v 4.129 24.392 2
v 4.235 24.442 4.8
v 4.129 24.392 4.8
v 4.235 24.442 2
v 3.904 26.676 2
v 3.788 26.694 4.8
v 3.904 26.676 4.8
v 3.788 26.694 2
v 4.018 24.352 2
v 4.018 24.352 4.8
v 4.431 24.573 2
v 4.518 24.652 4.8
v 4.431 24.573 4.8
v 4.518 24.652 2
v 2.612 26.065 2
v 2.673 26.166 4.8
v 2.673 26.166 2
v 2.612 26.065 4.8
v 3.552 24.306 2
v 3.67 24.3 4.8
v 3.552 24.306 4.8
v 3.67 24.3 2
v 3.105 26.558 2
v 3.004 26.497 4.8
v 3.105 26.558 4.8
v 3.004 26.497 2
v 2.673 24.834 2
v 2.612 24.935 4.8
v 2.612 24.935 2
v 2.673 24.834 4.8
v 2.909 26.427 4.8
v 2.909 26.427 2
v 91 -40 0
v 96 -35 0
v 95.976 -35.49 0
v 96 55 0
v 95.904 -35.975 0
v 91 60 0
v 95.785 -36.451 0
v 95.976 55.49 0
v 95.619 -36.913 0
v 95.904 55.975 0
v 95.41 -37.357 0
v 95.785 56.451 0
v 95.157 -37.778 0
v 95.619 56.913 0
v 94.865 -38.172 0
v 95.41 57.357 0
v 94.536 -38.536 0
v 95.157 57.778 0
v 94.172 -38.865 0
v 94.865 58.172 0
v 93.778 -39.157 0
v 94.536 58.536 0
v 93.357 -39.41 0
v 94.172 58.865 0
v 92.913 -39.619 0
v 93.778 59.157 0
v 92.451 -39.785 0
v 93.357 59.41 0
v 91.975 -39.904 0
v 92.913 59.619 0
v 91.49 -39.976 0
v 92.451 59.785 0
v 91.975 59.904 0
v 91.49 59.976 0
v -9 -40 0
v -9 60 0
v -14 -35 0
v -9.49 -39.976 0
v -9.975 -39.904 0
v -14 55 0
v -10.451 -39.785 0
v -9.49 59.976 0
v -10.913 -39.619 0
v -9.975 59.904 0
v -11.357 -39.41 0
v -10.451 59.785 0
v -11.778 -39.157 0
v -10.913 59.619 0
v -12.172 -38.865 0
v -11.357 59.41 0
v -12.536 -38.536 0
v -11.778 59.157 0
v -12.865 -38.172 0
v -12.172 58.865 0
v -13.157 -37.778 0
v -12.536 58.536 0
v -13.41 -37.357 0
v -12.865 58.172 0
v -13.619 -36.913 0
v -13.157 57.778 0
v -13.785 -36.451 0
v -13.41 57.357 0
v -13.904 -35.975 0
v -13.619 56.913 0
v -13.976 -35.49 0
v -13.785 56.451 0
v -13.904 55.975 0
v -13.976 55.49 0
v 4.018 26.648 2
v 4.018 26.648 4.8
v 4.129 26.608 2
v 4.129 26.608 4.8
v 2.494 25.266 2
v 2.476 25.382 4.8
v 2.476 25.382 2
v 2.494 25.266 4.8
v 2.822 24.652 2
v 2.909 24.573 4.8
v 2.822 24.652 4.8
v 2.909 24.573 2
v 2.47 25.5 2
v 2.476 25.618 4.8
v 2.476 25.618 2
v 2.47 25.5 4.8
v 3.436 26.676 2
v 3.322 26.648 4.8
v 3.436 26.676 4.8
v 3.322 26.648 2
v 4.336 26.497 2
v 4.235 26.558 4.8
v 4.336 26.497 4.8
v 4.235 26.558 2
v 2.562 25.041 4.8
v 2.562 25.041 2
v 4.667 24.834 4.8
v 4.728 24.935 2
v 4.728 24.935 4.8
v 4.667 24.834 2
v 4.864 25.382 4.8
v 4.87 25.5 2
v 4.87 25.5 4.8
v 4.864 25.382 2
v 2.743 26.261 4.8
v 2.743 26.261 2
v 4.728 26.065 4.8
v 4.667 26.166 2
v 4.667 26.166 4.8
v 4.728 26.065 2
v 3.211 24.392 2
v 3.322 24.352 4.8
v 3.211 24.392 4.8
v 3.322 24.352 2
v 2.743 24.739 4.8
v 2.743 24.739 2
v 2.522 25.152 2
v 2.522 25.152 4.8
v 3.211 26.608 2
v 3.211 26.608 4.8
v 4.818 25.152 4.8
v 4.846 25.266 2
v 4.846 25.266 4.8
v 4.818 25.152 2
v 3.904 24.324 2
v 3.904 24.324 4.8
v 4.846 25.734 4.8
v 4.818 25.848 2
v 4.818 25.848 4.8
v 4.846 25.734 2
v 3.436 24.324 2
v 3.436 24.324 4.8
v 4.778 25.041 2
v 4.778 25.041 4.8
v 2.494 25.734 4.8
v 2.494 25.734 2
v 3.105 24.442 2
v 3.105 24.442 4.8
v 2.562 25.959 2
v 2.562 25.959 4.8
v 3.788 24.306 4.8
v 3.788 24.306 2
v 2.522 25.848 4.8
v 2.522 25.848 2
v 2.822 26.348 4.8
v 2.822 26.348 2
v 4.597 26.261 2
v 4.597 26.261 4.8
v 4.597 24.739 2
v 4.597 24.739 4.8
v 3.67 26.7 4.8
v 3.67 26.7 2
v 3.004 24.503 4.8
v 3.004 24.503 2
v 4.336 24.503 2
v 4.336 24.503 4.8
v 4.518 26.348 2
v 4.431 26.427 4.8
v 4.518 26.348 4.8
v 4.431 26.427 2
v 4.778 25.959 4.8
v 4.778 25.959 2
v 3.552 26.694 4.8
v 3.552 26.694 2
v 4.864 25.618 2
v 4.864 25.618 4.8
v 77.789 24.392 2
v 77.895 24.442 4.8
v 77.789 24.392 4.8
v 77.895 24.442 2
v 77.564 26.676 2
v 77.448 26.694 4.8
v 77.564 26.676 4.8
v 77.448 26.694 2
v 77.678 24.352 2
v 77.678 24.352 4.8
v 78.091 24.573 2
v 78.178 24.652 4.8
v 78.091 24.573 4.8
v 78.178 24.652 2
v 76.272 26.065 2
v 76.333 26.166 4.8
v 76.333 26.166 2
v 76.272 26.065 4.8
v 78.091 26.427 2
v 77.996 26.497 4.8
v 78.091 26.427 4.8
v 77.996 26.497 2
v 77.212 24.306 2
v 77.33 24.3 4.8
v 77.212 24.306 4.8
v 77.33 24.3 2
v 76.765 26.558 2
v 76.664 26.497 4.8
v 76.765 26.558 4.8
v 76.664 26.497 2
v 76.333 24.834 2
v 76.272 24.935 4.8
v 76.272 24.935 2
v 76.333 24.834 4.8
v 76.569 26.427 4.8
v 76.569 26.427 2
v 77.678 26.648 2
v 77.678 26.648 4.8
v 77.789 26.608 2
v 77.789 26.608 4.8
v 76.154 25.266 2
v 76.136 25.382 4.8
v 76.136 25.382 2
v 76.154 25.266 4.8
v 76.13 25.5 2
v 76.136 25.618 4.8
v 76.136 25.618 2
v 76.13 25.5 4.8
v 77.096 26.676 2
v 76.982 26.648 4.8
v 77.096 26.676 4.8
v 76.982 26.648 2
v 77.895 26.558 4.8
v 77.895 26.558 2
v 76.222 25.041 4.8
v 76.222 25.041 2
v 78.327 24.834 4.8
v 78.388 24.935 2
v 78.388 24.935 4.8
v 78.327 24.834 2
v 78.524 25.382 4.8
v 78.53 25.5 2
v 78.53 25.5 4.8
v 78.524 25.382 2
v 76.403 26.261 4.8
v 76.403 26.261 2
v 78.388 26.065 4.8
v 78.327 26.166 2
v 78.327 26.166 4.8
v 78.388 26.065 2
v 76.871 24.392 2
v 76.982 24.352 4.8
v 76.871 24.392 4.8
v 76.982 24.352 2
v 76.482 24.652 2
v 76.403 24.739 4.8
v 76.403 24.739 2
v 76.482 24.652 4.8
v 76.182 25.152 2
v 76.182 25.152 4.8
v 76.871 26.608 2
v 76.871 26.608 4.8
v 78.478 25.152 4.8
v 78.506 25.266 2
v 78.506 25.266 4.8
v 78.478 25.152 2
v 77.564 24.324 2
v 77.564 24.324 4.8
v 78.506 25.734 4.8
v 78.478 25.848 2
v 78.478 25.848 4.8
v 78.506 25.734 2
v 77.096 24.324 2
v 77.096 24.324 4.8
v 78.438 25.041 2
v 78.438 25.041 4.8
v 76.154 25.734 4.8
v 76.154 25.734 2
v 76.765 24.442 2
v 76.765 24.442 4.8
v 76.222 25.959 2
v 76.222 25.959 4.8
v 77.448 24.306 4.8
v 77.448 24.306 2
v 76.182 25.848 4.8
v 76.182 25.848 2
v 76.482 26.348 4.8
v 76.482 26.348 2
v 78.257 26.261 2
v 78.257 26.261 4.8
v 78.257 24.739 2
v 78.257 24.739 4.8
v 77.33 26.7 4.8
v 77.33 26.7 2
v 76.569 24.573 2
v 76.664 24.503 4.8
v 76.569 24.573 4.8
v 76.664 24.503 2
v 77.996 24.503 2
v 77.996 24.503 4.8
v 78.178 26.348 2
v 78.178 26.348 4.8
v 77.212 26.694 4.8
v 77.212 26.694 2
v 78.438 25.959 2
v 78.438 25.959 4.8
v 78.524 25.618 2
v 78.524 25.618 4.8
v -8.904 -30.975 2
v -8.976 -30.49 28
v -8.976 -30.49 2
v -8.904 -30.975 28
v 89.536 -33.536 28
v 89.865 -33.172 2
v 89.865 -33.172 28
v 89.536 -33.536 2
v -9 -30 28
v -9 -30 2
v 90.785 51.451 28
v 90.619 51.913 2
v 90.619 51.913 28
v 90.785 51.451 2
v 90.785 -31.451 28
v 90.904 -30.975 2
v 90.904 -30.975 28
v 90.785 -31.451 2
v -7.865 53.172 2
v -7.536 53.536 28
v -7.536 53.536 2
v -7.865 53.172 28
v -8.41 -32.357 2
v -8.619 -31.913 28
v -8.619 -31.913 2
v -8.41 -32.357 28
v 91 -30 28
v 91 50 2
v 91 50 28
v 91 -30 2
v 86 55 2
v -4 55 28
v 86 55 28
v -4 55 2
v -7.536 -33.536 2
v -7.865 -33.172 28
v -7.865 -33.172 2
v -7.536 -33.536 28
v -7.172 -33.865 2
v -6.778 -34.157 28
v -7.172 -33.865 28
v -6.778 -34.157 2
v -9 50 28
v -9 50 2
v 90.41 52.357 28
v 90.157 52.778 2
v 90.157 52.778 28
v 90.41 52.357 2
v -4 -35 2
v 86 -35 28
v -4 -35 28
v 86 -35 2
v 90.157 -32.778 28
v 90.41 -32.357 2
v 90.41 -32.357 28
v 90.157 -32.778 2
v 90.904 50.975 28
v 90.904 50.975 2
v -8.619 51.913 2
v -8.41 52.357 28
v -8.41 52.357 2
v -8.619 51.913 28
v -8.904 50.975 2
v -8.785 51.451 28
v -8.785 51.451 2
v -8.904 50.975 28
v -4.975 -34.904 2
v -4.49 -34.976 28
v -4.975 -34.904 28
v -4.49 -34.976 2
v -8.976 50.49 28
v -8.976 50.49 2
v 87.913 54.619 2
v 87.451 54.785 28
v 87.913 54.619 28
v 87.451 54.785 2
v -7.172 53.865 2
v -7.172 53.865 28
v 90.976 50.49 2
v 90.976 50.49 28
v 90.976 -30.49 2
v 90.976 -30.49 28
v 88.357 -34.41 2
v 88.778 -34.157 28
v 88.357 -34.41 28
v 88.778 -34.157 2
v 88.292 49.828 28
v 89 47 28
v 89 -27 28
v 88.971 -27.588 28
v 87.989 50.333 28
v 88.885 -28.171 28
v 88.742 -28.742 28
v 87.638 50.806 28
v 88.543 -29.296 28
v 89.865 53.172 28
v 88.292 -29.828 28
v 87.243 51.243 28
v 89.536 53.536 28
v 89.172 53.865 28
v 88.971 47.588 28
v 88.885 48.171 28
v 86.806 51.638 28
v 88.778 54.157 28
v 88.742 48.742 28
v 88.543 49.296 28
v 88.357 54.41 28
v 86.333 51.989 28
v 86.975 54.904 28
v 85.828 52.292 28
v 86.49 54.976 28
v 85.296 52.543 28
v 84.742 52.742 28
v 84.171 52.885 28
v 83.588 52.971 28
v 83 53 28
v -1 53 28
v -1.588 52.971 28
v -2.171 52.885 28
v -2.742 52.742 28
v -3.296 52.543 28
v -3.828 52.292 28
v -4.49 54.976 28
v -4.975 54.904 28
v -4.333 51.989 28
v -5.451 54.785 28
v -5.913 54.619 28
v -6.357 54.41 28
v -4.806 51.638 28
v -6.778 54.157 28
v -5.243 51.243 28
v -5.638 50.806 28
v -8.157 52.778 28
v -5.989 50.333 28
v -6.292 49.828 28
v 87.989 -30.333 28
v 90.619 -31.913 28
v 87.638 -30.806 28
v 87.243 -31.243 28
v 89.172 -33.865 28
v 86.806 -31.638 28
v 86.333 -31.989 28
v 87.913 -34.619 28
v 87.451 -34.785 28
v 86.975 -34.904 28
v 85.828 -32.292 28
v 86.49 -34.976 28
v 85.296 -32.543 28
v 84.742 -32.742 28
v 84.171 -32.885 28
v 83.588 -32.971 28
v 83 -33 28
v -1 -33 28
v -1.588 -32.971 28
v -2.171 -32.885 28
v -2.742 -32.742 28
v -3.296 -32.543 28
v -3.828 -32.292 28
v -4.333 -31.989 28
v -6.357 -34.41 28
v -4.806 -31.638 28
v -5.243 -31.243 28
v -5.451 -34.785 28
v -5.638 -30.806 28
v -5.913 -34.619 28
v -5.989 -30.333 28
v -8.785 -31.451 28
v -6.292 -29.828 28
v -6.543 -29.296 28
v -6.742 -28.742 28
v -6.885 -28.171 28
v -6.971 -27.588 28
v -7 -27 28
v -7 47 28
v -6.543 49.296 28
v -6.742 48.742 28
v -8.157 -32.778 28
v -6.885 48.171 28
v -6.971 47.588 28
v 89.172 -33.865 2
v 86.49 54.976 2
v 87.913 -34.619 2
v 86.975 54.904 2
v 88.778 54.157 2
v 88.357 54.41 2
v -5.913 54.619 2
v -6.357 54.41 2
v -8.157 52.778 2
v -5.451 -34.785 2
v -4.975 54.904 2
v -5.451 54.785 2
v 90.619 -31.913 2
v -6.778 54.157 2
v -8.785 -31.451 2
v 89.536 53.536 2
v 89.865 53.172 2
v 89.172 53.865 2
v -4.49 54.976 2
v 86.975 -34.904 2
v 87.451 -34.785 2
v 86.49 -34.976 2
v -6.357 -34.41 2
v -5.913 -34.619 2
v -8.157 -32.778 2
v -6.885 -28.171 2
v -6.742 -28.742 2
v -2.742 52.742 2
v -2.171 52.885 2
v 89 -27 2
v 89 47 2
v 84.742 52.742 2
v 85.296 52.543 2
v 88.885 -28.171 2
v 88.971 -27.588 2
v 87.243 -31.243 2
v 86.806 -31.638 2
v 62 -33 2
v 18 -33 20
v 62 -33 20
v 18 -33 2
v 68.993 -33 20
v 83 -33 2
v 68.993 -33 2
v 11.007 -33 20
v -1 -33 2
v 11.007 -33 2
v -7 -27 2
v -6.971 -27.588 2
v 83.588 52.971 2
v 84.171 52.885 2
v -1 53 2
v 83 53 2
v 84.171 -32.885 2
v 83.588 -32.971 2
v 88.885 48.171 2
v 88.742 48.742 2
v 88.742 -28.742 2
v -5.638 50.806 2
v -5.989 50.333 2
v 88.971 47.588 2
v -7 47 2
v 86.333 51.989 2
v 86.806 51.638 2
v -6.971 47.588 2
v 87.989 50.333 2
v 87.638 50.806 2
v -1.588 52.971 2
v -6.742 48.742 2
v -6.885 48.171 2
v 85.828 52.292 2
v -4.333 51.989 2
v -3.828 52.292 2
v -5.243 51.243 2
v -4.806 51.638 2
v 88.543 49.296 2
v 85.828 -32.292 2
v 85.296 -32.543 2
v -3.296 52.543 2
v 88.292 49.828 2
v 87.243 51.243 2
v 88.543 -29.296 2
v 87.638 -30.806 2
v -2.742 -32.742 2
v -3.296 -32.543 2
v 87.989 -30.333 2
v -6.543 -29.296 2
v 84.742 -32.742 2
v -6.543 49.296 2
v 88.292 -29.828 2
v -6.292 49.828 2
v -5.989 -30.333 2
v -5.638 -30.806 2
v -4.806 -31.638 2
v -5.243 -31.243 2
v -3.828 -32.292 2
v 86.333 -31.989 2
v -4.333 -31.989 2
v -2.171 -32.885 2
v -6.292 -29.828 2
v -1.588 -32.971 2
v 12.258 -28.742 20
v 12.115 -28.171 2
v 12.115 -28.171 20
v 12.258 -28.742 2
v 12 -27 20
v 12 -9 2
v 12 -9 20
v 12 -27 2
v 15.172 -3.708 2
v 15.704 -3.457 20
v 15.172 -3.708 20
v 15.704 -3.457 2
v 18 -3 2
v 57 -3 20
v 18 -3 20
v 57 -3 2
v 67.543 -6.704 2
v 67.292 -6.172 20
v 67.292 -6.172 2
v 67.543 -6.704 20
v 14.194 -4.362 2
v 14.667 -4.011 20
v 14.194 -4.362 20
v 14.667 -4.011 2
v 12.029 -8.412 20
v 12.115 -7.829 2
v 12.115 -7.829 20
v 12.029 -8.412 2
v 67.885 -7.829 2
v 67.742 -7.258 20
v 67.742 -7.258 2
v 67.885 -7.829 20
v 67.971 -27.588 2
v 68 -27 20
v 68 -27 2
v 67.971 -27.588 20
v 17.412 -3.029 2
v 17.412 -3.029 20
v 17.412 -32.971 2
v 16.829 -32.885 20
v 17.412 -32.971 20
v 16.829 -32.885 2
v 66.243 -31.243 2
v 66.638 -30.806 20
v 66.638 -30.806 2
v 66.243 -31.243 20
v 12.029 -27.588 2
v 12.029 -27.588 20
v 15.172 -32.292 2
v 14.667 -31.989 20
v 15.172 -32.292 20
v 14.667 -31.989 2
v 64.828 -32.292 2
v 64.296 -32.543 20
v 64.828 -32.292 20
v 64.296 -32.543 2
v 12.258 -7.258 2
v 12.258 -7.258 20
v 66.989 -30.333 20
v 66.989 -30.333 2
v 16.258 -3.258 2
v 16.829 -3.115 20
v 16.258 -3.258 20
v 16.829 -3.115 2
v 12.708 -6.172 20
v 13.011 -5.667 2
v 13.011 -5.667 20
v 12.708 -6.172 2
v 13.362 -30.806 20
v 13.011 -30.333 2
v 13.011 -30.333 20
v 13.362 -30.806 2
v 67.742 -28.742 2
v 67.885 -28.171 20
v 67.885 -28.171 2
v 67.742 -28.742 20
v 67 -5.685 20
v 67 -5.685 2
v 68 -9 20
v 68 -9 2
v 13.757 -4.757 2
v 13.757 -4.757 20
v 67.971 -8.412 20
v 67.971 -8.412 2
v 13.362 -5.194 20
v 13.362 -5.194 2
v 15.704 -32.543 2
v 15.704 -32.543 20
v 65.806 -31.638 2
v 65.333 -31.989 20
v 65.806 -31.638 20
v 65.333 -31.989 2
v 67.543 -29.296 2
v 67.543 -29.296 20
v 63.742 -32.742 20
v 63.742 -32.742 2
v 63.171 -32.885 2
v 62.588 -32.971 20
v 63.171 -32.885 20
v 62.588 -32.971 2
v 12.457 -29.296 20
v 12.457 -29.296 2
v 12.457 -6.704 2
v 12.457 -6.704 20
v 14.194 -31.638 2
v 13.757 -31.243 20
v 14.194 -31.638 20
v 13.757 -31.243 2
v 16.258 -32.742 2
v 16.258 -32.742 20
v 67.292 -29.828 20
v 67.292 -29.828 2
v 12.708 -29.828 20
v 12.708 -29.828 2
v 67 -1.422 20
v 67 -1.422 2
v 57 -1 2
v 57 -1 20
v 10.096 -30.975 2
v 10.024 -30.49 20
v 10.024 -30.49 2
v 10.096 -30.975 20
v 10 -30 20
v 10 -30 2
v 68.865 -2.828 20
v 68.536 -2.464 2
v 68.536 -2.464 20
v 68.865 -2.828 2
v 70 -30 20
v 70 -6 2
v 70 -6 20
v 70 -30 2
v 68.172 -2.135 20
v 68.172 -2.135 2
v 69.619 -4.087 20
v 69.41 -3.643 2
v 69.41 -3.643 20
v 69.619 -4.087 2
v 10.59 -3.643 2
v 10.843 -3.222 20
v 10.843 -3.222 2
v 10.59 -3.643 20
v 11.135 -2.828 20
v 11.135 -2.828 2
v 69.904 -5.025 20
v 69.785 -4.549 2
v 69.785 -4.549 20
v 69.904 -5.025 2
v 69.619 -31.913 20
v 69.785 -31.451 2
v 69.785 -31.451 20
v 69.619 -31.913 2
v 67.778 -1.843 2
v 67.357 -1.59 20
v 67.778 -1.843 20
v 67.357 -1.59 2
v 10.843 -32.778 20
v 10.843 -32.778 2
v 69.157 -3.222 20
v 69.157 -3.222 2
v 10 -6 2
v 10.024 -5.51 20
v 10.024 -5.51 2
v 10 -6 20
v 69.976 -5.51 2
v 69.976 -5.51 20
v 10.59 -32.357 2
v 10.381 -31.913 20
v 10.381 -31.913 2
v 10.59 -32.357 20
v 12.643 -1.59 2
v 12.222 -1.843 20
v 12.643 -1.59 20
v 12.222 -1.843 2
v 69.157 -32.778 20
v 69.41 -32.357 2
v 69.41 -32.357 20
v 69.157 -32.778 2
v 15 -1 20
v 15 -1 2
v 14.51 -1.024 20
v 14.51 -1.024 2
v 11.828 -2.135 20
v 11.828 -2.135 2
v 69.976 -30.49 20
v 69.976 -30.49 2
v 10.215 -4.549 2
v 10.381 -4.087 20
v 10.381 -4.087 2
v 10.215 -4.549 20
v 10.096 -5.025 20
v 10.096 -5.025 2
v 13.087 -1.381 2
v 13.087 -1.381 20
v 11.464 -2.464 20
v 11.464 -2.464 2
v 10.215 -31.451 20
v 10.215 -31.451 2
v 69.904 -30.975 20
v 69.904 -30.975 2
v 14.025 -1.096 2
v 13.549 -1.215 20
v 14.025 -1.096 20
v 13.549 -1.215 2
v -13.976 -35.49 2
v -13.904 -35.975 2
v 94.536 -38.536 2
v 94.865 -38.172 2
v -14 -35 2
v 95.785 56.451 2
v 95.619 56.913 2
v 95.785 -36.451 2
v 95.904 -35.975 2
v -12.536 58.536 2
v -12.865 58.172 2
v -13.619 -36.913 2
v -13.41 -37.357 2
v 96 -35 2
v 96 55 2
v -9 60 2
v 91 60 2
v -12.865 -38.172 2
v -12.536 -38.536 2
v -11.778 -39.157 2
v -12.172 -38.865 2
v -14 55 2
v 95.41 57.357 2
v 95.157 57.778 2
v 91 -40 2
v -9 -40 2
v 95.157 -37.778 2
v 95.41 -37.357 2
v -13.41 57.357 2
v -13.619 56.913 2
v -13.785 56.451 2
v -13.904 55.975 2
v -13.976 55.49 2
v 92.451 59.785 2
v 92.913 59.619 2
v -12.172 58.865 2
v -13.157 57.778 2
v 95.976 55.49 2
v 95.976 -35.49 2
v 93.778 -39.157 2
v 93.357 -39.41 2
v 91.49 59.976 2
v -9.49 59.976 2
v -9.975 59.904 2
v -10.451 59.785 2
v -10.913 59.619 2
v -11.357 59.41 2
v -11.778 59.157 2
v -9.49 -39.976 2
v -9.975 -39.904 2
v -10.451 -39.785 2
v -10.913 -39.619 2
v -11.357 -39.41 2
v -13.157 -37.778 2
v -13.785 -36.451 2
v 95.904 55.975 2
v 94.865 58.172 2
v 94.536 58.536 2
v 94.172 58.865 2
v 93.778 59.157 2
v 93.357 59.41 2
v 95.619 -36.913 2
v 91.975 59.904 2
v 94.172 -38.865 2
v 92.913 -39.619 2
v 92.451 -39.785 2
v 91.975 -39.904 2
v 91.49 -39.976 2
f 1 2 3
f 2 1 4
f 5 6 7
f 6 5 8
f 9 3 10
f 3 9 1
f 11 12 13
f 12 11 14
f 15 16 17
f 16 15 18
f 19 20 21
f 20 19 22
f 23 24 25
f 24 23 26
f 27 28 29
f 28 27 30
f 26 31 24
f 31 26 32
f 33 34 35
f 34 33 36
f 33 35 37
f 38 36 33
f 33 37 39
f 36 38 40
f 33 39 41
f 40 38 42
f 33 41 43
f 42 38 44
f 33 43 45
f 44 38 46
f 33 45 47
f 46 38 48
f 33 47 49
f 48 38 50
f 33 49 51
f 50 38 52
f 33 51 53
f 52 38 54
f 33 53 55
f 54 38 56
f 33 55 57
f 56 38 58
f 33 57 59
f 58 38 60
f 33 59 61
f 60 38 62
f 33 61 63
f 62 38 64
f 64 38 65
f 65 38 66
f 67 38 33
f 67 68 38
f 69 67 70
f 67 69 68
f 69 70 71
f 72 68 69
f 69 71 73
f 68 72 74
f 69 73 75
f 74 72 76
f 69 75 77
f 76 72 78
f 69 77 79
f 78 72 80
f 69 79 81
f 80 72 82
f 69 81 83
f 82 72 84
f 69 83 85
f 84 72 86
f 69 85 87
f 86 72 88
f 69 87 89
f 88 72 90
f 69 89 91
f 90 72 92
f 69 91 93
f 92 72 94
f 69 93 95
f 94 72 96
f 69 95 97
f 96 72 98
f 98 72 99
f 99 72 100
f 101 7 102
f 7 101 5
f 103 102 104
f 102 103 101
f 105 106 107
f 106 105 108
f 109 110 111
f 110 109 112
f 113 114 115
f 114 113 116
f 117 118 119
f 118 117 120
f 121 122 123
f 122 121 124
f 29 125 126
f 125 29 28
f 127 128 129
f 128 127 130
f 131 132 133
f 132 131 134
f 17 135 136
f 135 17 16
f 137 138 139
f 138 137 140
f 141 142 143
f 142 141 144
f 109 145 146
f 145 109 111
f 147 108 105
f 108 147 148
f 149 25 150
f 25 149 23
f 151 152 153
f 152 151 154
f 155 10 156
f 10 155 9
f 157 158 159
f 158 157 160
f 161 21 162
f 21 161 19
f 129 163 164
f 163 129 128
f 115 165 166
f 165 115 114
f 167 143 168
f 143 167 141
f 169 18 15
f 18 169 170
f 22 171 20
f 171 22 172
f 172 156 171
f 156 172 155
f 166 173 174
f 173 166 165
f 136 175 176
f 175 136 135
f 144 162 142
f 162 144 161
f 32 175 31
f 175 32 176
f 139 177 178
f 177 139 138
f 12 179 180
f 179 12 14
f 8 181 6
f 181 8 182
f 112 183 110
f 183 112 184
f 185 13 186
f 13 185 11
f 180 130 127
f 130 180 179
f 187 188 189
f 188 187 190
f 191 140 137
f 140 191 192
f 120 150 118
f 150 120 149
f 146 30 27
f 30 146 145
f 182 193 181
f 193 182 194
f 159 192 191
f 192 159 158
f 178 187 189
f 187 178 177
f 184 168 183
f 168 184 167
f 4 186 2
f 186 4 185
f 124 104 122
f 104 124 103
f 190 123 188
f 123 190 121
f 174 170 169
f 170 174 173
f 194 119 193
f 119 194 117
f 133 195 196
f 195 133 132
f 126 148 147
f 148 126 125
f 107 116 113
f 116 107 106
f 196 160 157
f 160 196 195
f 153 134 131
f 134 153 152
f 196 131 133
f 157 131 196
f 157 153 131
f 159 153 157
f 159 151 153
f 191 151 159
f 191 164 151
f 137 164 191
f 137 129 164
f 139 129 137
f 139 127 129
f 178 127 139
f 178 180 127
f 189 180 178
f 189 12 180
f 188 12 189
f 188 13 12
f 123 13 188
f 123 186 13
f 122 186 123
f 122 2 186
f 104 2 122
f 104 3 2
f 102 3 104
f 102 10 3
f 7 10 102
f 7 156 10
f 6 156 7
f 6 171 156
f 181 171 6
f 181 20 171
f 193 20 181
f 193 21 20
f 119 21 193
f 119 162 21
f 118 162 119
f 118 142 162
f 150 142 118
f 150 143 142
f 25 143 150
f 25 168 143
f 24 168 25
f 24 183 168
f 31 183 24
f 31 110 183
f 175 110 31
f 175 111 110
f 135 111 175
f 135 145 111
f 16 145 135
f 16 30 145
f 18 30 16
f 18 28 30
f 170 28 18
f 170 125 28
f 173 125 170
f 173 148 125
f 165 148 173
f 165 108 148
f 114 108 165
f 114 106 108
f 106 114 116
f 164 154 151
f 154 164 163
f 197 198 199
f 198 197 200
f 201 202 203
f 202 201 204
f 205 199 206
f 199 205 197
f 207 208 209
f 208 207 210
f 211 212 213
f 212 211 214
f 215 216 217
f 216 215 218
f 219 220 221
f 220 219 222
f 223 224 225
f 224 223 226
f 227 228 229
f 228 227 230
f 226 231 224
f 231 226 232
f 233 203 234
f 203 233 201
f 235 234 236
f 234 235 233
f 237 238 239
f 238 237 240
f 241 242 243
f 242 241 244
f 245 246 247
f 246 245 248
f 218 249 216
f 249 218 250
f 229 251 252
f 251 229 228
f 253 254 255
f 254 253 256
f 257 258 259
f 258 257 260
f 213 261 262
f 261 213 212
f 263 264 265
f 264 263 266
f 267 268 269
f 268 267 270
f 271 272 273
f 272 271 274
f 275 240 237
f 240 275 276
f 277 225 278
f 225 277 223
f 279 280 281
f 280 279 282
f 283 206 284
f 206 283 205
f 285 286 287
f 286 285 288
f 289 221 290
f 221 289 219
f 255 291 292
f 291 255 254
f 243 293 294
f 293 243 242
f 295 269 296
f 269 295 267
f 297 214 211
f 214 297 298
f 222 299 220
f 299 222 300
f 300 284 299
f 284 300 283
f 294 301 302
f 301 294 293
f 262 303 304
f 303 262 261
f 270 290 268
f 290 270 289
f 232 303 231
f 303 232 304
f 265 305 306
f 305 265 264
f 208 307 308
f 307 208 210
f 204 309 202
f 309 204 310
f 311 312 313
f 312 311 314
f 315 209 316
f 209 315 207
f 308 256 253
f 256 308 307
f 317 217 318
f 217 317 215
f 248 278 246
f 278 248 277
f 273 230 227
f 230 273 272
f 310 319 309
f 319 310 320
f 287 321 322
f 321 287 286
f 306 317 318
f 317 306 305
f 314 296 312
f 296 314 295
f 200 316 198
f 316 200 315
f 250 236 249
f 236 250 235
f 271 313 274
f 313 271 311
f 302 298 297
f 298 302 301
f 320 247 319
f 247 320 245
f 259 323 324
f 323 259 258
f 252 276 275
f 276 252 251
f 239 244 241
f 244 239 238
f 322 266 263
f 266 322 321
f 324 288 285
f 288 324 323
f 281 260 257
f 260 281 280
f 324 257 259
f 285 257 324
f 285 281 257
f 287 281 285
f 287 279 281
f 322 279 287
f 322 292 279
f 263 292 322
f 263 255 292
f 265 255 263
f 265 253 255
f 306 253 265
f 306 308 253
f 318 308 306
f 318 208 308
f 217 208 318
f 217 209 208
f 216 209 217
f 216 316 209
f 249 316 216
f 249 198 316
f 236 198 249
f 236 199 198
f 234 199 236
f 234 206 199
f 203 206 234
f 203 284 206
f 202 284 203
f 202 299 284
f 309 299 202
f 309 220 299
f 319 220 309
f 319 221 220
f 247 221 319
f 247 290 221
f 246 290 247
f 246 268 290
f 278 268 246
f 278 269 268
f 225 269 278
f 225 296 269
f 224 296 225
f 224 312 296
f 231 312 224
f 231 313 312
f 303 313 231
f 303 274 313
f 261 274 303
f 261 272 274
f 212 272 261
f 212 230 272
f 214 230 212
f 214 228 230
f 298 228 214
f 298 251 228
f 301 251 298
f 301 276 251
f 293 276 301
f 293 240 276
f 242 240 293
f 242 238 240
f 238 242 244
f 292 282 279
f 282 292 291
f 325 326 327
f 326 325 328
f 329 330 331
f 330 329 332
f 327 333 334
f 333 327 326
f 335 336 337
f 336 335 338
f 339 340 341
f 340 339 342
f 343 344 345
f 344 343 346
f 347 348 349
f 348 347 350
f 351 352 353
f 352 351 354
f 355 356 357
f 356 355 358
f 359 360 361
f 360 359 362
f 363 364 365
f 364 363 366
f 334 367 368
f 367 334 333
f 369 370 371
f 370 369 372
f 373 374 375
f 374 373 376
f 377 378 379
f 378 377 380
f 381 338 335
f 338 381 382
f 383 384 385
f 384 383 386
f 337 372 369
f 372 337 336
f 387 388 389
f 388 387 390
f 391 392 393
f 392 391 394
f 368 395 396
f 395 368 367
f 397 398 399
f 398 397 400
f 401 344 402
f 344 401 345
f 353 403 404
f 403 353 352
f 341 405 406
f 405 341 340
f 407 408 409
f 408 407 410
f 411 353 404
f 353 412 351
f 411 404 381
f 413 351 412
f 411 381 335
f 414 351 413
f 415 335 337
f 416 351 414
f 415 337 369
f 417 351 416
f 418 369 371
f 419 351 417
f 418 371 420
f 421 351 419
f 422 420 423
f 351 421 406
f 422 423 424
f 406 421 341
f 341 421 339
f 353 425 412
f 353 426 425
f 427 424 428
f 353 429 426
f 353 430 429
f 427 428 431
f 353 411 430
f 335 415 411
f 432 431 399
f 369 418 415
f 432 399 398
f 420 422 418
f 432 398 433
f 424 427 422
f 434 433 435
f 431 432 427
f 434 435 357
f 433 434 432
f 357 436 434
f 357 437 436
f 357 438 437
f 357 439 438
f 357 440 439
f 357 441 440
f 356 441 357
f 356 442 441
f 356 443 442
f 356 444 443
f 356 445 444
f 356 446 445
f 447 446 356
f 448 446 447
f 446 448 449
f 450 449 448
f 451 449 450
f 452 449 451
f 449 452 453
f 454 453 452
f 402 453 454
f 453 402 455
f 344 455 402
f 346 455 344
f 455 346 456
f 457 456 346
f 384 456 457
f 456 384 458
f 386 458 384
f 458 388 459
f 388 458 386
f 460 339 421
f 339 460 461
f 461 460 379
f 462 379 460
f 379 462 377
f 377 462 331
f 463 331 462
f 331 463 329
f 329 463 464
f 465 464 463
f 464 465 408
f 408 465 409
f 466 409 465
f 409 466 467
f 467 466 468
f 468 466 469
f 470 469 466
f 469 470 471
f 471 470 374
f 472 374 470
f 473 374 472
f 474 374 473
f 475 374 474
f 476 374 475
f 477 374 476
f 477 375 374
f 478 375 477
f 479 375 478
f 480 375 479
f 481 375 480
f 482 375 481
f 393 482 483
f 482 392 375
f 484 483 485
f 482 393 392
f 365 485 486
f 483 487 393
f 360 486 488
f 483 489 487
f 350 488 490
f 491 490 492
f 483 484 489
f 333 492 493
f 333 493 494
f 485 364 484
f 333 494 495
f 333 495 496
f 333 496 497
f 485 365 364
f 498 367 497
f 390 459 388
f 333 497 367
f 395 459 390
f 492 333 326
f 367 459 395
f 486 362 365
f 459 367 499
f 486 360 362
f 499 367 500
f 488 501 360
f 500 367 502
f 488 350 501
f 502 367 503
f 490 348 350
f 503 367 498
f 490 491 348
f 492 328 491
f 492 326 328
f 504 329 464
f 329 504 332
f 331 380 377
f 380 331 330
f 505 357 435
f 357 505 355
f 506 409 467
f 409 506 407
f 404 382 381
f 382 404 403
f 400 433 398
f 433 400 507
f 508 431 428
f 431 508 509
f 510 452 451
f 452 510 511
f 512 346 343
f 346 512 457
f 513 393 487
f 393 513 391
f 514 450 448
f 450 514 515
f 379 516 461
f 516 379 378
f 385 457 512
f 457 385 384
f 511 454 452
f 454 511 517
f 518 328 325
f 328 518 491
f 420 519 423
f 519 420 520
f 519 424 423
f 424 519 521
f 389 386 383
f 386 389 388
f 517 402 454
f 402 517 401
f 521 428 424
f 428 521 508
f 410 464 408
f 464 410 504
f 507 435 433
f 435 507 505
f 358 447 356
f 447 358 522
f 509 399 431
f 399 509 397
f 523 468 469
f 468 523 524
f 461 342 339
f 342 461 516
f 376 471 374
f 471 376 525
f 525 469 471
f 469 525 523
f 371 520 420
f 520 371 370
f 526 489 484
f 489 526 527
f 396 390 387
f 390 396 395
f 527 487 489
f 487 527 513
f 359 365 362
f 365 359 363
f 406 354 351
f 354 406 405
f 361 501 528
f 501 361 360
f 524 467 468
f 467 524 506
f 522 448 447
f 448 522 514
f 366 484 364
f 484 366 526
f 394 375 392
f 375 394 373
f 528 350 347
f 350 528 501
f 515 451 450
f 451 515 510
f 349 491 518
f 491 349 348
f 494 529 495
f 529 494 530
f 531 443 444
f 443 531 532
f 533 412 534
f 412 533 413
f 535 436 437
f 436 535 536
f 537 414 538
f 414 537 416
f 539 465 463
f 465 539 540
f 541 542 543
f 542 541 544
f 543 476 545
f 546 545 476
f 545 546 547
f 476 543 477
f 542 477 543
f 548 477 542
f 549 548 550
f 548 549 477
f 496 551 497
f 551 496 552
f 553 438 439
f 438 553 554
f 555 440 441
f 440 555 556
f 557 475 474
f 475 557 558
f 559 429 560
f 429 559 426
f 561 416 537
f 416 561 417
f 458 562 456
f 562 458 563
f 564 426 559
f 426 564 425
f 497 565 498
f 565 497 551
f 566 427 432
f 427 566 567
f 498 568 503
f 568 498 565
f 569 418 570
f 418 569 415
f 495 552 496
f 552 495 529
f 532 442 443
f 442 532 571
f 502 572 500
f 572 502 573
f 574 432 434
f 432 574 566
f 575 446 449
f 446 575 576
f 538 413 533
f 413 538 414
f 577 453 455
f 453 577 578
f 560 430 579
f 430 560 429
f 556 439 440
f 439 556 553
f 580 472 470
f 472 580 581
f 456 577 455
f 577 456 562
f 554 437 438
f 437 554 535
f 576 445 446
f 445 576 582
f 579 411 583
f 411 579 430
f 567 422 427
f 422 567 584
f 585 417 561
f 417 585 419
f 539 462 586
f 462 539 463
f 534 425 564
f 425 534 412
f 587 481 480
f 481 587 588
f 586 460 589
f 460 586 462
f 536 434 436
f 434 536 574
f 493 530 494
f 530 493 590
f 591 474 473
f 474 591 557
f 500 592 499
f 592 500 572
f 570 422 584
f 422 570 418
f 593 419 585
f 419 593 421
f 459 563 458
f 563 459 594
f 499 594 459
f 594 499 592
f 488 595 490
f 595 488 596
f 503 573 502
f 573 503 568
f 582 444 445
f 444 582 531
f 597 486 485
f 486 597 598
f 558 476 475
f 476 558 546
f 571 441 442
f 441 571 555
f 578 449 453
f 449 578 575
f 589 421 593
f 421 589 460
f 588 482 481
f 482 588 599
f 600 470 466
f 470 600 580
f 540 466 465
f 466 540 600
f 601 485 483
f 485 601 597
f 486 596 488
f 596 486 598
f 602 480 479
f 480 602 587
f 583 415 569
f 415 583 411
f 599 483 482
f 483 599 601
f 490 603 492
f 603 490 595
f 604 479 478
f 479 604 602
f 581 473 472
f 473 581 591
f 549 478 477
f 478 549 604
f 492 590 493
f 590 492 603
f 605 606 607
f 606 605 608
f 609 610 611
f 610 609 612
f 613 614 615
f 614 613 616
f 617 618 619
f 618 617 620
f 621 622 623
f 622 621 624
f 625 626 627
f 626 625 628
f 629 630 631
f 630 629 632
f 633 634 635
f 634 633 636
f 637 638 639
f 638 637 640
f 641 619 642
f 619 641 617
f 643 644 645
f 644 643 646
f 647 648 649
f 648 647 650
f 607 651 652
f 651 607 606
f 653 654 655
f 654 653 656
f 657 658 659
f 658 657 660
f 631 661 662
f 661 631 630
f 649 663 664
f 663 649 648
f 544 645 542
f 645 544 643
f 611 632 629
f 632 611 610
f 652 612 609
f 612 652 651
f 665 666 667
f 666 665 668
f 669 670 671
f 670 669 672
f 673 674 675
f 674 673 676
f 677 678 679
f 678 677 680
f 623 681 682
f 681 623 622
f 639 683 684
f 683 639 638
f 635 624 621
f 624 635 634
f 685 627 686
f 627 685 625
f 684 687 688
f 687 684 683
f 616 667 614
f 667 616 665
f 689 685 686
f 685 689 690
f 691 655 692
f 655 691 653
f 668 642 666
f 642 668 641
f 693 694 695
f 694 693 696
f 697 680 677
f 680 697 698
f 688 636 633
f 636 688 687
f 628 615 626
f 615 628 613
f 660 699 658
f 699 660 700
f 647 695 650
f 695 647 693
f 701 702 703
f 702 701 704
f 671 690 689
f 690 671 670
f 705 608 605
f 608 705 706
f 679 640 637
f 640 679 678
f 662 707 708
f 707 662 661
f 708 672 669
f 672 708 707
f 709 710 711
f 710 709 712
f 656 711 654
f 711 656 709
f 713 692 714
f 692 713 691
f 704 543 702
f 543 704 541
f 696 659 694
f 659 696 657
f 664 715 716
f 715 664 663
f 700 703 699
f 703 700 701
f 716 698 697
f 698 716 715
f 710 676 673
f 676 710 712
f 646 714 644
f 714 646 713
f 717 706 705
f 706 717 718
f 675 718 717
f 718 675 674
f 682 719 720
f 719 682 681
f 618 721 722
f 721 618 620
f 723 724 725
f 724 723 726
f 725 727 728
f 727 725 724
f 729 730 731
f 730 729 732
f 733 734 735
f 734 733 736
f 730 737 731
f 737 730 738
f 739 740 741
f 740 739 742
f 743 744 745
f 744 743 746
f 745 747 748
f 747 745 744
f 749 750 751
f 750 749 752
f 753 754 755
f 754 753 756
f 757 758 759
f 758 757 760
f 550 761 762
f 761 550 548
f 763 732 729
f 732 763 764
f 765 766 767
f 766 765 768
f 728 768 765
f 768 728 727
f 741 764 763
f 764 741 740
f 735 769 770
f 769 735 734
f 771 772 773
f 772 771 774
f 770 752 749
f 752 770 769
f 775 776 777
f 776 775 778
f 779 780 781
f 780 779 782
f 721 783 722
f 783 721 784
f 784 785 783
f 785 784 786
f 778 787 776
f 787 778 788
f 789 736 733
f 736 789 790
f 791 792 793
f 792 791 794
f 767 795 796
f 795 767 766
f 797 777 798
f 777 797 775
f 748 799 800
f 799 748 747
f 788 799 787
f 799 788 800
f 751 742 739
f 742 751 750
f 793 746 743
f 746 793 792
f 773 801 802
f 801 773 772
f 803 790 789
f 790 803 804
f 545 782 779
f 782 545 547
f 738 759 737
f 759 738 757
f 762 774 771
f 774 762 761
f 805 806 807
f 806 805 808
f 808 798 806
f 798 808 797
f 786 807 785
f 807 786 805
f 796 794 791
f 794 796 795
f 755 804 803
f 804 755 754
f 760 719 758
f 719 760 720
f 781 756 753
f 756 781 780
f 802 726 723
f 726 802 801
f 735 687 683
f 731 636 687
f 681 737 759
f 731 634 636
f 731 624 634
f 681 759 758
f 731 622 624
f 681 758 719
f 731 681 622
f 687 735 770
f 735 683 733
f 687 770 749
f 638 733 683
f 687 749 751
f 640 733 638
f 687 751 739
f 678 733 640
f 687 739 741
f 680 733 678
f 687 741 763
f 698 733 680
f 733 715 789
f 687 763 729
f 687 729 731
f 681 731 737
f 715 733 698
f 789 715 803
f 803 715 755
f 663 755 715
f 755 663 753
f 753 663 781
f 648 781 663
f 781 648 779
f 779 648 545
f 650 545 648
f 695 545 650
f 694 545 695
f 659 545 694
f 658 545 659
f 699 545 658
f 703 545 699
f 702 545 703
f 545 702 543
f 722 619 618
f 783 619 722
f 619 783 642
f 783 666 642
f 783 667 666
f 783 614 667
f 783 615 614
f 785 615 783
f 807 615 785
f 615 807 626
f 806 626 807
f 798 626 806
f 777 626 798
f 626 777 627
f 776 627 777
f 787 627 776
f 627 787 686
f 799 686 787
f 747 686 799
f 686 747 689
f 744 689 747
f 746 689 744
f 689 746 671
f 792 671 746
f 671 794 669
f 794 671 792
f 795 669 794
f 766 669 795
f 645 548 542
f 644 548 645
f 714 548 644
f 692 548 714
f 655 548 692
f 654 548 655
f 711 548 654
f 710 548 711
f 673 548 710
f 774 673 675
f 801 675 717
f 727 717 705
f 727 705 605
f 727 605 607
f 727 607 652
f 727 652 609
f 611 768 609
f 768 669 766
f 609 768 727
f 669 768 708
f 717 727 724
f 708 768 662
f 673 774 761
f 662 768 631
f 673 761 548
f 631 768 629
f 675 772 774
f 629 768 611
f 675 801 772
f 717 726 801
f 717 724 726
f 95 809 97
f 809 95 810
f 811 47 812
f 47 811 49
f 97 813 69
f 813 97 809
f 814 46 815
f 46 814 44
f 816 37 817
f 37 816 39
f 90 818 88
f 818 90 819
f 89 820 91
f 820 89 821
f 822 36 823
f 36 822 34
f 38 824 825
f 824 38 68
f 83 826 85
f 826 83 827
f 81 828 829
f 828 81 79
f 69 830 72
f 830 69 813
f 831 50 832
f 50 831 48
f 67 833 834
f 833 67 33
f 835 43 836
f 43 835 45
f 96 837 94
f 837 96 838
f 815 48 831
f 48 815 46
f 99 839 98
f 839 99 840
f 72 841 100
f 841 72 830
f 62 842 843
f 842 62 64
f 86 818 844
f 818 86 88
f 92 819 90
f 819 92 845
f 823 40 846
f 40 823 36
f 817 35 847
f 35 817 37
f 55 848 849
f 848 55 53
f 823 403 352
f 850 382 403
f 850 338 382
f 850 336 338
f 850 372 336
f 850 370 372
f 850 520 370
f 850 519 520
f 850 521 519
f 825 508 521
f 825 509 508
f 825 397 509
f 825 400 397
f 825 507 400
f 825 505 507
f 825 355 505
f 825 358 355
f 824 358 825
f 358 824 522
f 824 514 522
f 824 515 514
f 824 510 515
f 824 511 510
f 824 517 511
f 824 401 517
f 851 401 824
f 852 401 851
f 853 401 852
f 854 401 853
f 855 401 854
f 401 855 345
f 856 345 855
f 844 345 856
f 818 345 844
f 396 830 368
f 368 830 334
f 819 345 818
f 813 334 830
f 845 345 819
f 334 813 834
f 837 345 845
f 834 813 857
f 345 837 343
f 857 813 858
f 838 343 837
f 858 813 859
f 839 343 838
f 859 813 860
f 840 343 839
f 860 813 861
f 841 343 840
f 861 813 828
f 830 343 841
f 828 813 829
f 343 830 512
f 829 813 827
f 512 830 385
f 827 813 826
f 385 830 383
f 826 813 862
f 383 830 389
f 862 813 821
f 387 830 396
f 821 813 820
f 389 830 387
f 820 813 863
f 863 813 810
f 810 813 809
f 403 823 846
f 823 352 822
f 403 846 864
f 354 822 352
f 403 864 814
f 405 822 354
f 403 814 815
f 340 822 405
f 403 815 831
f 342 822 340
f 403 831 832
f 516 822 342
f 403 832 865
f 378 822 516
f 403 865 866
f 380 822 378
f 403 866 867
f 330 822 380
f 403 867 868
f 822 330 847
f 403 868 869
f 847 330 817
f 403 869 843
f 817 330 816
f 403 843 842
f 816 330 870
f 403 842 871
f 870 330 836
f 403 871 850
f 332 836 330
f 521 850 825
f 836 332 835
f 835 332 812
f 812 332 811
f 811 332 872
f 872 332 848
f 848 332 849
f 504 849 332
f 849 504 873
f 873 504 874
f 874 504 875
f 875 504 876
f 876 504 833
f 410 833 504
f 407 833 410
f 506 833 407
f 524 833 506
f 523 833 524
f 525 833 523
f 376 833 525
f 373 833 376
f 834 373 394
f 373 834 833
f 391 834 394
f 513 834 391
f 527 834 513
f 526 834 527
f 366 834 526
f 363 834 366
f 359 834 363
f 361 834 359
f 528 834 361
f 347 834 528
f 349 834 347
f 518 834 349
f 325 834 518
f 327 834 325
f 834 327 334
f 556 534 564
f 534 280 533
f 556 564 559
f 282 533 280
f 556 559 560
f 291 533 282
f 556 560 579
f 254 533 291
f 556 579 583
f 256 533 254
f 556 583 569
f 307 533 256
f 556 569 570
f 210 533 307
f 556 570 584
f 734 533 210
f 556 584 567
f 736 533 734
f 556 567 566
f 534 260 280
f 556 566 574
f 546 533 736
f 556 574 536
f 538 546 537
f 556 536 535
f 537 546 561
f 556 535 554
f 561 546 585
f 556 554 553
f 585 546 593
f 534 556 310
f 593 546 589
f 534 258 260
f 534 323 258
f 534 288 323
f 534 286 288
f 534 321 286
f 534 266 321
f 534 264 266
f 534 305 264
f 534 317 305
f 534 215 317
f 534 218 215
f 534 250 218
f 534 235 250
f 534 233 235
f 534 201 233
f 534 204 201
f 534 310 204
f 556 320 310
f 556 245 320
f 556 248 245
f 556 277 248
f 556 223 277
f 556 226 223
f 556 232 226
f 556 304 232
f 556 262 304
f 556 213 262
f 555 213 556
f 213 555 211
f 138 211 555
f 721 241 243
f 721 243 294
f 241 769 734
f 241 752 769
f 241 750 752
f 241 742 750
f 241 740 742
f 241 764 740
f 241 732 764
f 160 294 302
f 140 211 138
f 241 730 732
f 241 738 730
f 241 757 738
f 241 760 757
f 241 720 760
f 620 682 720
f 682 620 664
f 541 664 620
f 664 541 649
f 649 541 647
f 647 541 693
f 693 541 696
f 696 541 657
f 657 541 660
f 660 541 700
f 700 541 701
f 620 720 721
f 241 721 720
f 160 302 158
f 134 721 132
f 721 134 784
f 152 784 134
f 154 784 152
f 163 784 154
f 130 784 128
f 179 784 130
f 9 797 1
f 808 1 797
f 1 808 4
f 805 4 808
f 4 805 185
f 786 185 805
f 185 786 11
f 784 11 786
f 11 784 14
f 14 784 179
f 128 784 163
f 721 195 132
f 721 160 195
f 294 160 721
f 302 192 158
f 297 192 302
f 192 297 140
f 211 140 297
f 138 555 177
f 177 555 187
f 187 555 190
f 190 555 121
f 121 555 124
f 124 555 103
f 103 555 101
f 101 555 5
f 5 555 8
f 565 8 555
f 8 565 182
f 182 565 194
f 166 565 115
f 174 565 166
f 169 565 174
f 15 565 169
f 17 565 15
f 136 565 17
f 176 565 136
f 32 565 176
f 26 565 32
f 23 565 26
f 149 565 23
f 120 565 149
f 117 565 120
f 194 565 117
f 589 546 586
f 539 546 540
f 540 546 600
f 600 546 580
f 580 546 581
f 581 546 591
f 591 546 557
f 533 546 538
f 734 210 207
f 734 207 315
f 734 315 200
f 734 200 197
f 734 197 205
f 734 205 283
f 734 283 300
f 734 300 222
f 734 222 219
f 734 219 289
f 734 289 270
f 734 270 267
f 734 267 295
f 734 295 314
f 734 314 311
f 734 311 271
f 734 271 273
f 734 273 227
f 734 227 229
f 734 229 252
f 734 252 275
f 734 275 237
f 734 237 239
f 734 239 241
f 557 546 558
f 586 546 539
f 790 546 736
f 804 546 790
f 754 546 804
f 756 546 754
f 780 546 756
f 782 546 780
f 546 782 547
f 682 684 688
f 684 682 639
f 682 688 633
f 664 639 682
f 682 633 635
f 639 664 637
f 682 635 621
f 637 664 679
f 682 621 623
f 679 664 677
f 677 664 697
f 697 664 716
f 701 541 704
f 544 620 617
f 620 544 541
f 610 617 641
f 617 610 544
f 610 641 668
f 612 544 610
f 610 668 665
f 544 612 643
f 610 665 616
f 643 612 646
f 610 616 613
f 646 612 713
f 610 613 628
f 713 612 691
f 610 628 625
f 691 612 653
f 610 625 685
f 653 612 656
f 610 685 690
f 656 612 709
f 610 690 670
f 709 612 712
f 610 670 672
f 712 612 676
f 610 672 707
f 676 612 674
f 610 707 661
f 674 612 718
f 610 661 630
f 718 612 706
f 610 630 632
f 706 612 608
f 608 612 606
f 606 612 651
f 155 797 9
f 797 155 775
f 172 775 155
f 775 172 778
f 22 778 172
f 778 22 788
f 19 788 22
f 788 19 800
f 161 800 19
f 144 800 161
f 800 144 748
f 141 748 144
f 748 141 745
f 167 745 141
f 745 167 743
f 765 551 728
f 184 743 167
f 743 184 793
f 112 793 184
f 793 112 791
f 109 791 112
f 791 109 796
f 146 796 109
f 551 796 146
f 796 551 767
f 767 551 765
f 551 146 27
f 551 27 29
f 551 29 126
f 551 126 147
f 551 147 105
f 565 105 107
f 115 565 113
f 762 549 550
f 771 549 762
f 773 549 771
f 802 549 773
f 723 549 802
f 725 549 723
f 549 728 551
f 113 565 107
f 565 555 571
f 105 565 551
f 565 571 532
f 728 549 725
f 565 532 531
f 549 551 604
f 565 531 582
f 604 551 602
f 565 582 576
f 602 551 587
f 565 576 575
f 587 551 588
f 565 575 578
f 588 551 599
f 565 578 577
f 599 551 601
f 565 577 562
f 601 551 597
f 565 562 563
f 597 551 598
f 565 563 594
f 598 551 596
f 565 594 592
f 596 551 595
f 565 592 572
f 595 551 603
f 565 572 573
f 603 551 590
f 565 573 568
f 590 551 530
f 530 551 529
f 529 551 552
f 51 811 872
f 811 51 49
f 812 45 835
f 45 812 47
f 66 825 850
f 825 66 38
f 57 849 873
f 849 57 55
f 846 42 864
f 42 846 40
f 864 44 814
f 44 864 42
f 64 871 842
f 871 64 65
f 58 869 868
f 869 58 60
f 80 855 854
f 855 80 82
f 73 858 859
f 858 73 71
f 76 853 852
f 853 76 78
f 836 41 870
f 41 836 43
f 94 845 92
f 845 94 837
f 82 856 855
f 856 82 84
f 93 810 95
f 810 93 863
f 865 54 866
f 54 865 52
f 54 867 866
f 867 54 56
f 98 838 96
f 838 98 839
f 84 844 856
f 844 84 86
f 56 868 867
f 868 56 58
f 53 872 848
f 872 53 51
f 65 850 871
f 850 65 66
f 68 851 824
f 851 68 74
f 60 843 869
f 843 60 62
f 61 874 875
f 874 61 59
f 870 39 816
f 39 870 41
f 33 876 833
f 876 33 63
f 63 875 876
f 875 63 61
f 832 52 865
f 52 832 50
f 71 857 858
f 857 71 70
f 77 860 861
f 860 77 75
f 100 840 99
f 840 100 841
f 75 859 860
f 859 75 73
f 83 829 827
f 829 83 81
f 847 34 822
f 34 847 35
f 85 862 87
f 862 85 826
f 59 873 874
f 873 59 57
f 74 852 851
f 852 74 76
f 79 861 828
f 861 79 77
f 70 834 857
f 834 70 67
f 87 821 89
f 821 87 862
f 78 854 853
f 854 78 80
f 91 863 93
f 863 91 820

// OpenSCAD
// file: ada_pcb571.scad
/**
 * Adafruit Prototyping Board (571 holes)
 * https://www.adafruit.com/product/571
 */

// pcb
ada_pcb571_width = 81;
ada_pcb571_length = 51;
ada_pcb571_height = 1.6;

// mount holes
ada_pcb571_mount_radius = 3.2 / 2;
ada_pcb571_mount_width = 73.66;
ada_pcb571_mount_length = 0;

// parts
ada_pcb571_parts_height = 25;

// clearance dimensions
ada_pcb571_total_height = ada_pcb571_height + ada_pcb571_parts_height;

/**
 * Mount Holes
 */
module ada_pcb571_mount_holes() {
    offset_width = 0.5 * (ada_pcb571_width - ada_pcb571_mount_width);
    offset_length = 0.5 * (ada_pcb571_length - ada_pcb571_mount_length);

    translate([
        offset_width,
        offset_length
    ])
    circle(ada_pcb571_mount_radius);

    translate([
        ada_pcb571_width - offset_width,
        offset_length
    ])
    circle(ada_pcb571_mount_radius);
}

/**
 * PCB
 */
module ada_pcb571(include_pins=$preview, show_parts=$preview) {
    // board
    color([0.8, 0.6, 0.45])
    linear_extrude(ada_pcb571_height) {
        difference() {
            // board
            square([ada_pcb571_width, ada_pcb571_length]);
            
            // mount holes
            ada_pcb571_mount_holes();
        }
    }
    
    // mounting pins
    if (include_pins) {
        ada_pcb571_mount_pins();
    }
    
    // clearance region for mounted parts
    if (show_parts) {
        color("gray", 0.25)
        translate([0, 0, ada_pcb571_height + 0.1])
        cube([
            ada_pcb571_width,
            ada_pcb571_length,
            ada_pcb571_parts_height - 0.1
        ]);
    }
}

/**
 * Mount Pins
 */
module ada_pcb571_mount_pins() {
    color("grey")
    linear_extrude(2.4 * ada_pcb571_height) {
        offset(r=-0.4) {
            ada_pcb571_mount_holes();
        }
    }
}

/**
 * Preview
 */
ada_pcb571_preview = true;
if (ada_pcb571_preview) {
    $fn = 64;
    ada_pcb571();
}
// file: battery.scad
/**
 * 9 Volt Battery
 */

// battery
battery_width = 25;
battery_length = 16;
battery_height = 47;

// connector
battery_connector_height = 4;

// clearance values
battery_total_height = battery_height + battery_connector_height;

/**
 * Battery
 */
module battery() {
    color("silver")
    cube([battery_width, battery_length, battery_height]);
}

/**
 * Preview
 */
battery_preview = true;
if (battery_preview) {
    battery();
}
// main file
/**
 * Case Base
 */

// models
include <battery.scad>
include <ada_pcb571.scad>

// disable previews
battery_preview = false;
ada_pcb571_preview = false;

// base
snowlite_base_wall_thickness = 2;
snowlite_base_wall = 3; // outer wall thickness
snowlite_base_lip = 2; // inner lip thickness
snowlite_base_radius = 5; // used for curvature of case corners
snowlite_base_internal_components_height = ada_pcb571_height + battery_width + 6; // 
snowlite_base_clearance_depth = 28;

/**
 * Round rectangle shape.
 */
module rounded_square(width, length, radius) {
    hull() {
        translate([radius, radius, 0])
        circle(radius);
        
        translate([width - radius, radius, 0])
        circle(radius);
        
        translate([radius, length - radius, 0])
        circle(radius);
        
        translate([width - radius, length - radius, 0])
        circle(radius);
    }
}

/**
 * Base & PCB Mount Pins
 */
module base_mount_pins() {
    offset_width = 0.5 * (ada_pcb571_width - ada_pcb571_mount_width);
    offset_length = 0.5 * (ada_pcb571_length - ada_pcb571_mount_length);

    translate([
        offset_width,
        offset_length
    ])
    linear_extrude(3 * ada_pcb571_height) {
        offset(r=-0.4) {
            circle(ada_pcb571_mount_radius);
        }
    }
   
    translate([
        ada_pcb571_width - offset_width,
        offset_length
    ])
    linear_extrude(3 * ada_pcb571_height) {
        offset(r=-0.4) {
            circle(ada_pcb571_mount_radius);
        }
    }
}

/**
 * Base
 */
module snowlite_base() {
    union() {  
        union() {
            // pcb mount pins
            base_mount_pins();

            // lip
            translate([-14,  -40, 0]) {
                linear_extrude(2) {
                    rounded_square(110, 100, 5);
                }
            }

            // wall of case
            difference() {
                translate([-9, -35, 0]) {
                    linear_extrude(snowlite_base_clearance_depth) {
                        rounded_square(100,90,5);
                    }
                }

                translate([-7,-33,0]) {
                    linear_extrude(snowlite_base_clearance_depth + 10) {
                        rounded_square(96,86,6);
                    }
                }
            }

            // battery container
            difference() {
                translate([10, -35, 0]) {
                    linear_extrude(battery_length + 4) {
                        rounded_square(60, 34, 5);
                    }
                }

               // battery cable hole
               translate([12,-33,0]) {
                    linear_extrude(battery_length + 14) {
                        rounded_square(56, 30, 6);
                    }
                
                    translate([45, 25, 0]) {
                        cube(size = [10,10,battery_length + 14]);
                    }
                }  
            }       
        }                      
    }  
}

/**
 * Preview
 */
snowlite_base_preview = true;
if (snowlite_base_preview) {
    $fn = 64;
    snowlite_base();
}
